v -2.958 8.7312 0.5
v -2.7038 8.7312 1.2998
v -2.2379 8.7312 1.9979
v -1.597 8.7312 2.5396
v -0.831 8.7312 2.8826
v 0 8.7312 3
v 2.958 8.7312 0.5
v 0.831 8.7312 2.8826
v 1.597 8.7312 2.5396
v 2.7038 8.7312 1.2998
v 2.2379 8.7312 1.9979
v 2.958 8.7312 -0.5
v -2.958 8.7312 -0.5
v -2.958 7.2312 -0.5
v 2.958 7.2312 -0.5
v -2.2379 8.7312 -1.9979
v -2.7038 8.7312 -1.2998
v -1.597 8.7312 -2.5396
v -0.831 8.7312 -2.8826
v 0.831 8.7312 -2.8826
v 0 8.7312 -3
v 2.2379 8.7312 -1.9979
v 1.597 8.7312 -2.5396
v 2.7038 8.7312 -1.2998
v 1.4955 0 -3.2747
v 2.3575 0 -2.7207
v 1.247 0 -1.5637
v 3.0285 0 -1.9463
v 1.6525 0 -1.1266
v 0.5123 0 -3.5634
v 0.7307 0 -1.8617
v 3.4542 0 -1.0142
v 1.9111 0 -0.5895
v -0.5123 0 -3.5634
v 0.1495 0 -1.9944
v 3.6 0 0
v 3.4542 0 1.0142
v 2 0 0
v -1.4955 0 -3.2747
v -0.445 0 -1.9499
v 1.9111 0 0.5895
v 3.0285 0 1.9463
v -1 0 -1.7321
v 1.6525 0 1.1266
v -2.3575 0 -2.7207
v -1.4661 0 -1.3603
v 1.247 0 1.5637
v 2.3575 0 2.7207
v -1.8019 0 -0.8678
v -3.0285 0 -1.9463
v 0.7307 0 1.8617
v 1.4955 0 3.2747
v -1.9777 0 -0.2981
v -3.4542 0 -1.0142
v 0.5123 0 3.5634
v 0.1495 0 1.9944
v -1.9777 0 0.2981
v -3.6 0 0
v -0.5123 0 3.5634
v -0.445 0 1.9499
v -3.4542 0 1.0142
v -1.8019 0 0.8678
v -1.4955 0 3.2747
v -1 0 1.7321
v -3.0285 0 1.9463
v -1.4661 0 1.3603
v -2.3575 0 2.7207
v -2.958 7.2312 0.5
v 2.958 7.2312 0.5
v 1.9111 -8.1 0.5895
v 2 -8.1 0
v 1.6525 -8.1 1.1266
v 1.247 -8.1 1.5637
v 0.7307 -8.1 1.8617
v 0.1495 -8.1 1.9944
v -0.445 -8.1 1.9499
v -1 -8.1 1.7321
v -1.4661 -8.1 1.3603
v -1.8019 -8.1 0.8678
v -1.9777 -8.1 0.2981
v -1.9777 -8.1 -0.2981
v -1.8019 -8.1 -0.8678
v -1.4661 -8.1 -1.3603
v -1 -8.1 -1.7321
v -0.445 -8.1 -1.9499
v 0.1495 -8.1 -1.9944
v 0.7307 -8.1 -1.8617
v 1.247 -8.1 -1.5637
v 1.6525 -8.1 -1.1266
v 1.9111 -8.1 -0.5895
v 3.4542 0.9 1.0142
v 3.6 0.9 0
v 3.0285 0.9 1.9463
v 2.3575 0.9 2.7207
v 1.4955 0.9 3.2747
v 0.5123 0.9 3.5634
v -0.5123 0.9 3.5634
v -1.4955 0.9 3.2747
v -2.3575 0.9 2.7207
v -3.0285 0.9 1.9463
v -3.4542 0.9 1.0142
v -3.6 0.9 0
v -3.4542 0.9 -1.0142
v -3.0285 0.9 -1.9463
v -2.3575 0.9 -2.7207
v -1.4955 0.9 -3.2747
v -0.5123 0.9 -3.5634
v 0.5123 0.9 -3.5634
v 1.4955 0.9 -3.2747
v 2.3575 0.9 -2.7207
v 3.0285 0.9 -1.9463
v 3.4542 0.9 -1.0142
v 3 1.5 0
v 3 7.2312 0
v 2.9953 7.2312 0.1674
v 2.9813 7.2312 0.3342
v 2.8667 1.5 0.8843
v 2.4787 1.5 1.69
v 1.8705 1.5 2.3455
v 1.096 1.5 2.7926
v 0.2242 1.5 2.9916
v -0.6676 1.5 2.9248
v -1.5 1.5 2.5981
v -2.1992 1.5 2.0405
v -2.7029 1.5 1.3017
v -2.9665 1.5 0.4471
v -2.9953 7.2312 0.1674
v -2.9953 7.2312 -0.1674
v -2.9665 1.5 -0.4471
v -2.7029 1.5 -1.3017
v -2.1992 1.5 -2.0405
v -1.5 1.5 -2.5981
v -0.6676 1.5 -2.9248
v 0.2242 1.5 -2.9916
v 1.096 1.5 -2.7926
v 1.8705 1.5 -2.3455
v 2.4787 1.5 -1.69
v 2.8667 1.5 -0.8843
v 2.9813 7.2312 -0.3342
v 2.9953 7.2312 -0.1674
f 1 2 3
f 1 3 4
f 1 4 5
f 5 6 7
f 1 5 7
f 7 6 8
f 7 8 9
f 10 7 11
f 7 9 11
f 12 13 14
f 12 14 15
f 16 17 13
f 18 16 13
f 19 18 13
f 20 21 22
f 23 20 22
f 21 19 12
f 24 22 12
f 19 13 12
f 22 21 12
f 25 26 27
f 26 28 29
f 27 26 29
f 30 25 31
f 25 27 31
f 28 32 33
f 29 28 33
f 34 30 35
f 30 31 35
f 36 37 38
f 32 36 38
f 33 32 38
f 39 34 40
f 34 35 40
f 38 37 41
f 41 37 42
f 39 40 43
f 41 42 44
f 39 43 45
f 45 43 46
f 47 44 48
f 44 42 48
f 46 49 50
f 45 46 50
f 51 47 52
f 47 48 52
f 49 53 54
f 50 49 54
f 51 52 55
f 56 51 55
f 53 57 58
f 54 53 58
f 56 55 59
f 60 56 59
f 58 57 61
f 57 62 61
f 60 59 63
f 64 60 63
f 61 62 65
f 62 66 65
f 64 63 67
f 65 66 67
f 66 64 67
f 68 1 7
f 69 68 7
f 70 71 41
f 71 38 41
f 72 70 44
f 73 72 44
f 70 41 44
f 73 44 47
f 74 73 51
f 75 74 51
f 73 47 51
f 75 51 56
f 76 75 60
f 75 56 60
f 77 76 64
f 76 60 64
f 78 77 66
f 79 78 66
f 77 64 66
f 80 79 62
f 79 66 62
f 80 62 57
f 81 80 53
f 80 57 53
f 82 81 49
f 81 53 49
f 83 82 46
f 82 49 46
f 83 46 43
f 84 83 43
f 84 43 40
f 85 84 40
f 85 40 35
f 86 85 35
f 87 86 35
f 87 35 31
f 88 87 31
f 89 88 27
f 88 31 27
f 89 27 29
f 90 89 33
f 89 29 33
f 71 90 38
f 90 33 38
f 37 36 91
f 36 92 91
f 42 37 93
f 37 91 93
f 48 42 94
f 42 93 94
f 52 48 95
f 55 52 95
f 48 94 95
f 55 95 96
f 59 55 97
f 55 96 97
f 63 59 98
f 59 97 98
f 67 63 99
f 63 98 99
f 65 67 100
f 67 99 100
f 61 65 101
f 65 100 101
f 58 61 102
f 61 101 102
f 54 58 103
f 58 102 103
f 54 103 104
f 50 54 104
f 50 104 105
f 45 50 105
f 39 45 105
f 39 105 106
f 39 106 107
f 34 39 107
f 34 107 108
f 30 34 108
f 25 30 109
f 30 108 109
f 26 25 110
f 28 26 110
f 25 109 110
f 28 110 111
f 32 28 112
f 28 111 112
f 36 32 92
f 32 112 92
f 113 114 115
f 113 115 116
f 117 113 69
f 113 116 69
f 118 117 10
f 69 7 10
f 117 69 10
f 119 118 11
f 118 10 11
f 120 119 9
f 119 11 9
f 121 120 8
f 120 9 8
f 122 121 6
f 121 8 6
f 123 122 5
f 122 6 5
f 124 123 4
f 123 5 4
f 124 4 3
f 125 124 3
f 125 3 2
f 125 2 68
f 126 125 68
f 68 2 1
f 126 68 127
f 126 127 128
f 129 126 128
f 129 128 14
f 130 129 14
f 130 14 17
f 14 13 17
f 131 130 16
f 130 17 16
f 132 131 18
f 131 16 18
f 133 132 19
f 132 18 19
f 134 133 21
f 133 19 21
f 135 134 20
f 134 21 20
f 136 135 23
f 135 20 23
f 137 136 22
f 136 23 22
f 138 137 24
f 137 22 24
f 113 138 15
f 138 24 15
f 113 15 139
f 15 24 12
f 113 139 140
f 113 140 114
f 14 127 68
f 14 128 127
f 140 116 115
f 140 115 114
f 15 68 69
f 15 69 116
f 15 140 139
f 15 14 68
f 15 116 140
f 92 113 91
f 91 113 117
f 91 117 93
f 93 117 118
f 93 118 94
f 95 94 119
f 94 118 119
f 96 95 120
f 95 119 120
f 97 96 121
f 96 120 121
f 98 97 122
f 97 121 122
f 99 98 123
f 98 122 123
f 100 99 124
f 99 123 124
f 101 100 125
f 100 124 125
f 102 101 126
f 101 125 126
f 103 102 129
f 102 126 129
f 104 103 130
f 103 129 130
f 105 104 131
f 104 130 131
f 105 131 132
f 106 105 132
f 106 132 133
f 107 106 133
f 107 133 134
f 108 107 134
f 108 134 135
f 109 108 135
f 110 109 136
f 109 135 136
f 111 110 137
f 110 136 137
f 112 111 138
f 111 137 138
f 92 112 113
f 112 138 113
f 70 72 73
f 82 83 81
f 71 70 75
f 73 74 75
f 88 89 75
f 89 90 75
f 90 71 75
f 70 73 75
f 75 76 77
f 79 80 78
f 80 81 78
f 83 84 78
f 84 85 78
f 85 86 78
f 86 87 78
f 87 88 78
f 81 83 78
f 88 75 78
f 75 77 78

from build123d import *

# Parameters (mm, degrees)
SKETCH3_W          = 6
SKETCH3_H          = 1
CUT_EXTRUDE1_DEPTH = 1.5


with BuildPart() as part:
    # Sketch2 → Revolve1 (revolve)
    with BuildSketch(Plane.XY):
        Polygon((0, -8.1), (2, -8.1), (2, 0), (3.6, 0), (3.6, 0.9), (3, 1.5), (3, 8.73125), (0, 8.73125), align=None)
    revolve(axis=Axis((0, 43.323370715, 0), (0, -1, 0)))

    # Sketch3 → Cut-Extrude1 (cut)
    with BuildSketch(Plane(origin=(0, 8.73125, 0), x_dir=(1, 0, 0), z_dir=(0, 1, 0))):
        Rectangle(SKETCH3_W, SKETCH3_H)
    extrude(amount=-CUT_EXTRUDE1_DEPTH, mode=Mode.SUBTRACT)


solid = part.part
